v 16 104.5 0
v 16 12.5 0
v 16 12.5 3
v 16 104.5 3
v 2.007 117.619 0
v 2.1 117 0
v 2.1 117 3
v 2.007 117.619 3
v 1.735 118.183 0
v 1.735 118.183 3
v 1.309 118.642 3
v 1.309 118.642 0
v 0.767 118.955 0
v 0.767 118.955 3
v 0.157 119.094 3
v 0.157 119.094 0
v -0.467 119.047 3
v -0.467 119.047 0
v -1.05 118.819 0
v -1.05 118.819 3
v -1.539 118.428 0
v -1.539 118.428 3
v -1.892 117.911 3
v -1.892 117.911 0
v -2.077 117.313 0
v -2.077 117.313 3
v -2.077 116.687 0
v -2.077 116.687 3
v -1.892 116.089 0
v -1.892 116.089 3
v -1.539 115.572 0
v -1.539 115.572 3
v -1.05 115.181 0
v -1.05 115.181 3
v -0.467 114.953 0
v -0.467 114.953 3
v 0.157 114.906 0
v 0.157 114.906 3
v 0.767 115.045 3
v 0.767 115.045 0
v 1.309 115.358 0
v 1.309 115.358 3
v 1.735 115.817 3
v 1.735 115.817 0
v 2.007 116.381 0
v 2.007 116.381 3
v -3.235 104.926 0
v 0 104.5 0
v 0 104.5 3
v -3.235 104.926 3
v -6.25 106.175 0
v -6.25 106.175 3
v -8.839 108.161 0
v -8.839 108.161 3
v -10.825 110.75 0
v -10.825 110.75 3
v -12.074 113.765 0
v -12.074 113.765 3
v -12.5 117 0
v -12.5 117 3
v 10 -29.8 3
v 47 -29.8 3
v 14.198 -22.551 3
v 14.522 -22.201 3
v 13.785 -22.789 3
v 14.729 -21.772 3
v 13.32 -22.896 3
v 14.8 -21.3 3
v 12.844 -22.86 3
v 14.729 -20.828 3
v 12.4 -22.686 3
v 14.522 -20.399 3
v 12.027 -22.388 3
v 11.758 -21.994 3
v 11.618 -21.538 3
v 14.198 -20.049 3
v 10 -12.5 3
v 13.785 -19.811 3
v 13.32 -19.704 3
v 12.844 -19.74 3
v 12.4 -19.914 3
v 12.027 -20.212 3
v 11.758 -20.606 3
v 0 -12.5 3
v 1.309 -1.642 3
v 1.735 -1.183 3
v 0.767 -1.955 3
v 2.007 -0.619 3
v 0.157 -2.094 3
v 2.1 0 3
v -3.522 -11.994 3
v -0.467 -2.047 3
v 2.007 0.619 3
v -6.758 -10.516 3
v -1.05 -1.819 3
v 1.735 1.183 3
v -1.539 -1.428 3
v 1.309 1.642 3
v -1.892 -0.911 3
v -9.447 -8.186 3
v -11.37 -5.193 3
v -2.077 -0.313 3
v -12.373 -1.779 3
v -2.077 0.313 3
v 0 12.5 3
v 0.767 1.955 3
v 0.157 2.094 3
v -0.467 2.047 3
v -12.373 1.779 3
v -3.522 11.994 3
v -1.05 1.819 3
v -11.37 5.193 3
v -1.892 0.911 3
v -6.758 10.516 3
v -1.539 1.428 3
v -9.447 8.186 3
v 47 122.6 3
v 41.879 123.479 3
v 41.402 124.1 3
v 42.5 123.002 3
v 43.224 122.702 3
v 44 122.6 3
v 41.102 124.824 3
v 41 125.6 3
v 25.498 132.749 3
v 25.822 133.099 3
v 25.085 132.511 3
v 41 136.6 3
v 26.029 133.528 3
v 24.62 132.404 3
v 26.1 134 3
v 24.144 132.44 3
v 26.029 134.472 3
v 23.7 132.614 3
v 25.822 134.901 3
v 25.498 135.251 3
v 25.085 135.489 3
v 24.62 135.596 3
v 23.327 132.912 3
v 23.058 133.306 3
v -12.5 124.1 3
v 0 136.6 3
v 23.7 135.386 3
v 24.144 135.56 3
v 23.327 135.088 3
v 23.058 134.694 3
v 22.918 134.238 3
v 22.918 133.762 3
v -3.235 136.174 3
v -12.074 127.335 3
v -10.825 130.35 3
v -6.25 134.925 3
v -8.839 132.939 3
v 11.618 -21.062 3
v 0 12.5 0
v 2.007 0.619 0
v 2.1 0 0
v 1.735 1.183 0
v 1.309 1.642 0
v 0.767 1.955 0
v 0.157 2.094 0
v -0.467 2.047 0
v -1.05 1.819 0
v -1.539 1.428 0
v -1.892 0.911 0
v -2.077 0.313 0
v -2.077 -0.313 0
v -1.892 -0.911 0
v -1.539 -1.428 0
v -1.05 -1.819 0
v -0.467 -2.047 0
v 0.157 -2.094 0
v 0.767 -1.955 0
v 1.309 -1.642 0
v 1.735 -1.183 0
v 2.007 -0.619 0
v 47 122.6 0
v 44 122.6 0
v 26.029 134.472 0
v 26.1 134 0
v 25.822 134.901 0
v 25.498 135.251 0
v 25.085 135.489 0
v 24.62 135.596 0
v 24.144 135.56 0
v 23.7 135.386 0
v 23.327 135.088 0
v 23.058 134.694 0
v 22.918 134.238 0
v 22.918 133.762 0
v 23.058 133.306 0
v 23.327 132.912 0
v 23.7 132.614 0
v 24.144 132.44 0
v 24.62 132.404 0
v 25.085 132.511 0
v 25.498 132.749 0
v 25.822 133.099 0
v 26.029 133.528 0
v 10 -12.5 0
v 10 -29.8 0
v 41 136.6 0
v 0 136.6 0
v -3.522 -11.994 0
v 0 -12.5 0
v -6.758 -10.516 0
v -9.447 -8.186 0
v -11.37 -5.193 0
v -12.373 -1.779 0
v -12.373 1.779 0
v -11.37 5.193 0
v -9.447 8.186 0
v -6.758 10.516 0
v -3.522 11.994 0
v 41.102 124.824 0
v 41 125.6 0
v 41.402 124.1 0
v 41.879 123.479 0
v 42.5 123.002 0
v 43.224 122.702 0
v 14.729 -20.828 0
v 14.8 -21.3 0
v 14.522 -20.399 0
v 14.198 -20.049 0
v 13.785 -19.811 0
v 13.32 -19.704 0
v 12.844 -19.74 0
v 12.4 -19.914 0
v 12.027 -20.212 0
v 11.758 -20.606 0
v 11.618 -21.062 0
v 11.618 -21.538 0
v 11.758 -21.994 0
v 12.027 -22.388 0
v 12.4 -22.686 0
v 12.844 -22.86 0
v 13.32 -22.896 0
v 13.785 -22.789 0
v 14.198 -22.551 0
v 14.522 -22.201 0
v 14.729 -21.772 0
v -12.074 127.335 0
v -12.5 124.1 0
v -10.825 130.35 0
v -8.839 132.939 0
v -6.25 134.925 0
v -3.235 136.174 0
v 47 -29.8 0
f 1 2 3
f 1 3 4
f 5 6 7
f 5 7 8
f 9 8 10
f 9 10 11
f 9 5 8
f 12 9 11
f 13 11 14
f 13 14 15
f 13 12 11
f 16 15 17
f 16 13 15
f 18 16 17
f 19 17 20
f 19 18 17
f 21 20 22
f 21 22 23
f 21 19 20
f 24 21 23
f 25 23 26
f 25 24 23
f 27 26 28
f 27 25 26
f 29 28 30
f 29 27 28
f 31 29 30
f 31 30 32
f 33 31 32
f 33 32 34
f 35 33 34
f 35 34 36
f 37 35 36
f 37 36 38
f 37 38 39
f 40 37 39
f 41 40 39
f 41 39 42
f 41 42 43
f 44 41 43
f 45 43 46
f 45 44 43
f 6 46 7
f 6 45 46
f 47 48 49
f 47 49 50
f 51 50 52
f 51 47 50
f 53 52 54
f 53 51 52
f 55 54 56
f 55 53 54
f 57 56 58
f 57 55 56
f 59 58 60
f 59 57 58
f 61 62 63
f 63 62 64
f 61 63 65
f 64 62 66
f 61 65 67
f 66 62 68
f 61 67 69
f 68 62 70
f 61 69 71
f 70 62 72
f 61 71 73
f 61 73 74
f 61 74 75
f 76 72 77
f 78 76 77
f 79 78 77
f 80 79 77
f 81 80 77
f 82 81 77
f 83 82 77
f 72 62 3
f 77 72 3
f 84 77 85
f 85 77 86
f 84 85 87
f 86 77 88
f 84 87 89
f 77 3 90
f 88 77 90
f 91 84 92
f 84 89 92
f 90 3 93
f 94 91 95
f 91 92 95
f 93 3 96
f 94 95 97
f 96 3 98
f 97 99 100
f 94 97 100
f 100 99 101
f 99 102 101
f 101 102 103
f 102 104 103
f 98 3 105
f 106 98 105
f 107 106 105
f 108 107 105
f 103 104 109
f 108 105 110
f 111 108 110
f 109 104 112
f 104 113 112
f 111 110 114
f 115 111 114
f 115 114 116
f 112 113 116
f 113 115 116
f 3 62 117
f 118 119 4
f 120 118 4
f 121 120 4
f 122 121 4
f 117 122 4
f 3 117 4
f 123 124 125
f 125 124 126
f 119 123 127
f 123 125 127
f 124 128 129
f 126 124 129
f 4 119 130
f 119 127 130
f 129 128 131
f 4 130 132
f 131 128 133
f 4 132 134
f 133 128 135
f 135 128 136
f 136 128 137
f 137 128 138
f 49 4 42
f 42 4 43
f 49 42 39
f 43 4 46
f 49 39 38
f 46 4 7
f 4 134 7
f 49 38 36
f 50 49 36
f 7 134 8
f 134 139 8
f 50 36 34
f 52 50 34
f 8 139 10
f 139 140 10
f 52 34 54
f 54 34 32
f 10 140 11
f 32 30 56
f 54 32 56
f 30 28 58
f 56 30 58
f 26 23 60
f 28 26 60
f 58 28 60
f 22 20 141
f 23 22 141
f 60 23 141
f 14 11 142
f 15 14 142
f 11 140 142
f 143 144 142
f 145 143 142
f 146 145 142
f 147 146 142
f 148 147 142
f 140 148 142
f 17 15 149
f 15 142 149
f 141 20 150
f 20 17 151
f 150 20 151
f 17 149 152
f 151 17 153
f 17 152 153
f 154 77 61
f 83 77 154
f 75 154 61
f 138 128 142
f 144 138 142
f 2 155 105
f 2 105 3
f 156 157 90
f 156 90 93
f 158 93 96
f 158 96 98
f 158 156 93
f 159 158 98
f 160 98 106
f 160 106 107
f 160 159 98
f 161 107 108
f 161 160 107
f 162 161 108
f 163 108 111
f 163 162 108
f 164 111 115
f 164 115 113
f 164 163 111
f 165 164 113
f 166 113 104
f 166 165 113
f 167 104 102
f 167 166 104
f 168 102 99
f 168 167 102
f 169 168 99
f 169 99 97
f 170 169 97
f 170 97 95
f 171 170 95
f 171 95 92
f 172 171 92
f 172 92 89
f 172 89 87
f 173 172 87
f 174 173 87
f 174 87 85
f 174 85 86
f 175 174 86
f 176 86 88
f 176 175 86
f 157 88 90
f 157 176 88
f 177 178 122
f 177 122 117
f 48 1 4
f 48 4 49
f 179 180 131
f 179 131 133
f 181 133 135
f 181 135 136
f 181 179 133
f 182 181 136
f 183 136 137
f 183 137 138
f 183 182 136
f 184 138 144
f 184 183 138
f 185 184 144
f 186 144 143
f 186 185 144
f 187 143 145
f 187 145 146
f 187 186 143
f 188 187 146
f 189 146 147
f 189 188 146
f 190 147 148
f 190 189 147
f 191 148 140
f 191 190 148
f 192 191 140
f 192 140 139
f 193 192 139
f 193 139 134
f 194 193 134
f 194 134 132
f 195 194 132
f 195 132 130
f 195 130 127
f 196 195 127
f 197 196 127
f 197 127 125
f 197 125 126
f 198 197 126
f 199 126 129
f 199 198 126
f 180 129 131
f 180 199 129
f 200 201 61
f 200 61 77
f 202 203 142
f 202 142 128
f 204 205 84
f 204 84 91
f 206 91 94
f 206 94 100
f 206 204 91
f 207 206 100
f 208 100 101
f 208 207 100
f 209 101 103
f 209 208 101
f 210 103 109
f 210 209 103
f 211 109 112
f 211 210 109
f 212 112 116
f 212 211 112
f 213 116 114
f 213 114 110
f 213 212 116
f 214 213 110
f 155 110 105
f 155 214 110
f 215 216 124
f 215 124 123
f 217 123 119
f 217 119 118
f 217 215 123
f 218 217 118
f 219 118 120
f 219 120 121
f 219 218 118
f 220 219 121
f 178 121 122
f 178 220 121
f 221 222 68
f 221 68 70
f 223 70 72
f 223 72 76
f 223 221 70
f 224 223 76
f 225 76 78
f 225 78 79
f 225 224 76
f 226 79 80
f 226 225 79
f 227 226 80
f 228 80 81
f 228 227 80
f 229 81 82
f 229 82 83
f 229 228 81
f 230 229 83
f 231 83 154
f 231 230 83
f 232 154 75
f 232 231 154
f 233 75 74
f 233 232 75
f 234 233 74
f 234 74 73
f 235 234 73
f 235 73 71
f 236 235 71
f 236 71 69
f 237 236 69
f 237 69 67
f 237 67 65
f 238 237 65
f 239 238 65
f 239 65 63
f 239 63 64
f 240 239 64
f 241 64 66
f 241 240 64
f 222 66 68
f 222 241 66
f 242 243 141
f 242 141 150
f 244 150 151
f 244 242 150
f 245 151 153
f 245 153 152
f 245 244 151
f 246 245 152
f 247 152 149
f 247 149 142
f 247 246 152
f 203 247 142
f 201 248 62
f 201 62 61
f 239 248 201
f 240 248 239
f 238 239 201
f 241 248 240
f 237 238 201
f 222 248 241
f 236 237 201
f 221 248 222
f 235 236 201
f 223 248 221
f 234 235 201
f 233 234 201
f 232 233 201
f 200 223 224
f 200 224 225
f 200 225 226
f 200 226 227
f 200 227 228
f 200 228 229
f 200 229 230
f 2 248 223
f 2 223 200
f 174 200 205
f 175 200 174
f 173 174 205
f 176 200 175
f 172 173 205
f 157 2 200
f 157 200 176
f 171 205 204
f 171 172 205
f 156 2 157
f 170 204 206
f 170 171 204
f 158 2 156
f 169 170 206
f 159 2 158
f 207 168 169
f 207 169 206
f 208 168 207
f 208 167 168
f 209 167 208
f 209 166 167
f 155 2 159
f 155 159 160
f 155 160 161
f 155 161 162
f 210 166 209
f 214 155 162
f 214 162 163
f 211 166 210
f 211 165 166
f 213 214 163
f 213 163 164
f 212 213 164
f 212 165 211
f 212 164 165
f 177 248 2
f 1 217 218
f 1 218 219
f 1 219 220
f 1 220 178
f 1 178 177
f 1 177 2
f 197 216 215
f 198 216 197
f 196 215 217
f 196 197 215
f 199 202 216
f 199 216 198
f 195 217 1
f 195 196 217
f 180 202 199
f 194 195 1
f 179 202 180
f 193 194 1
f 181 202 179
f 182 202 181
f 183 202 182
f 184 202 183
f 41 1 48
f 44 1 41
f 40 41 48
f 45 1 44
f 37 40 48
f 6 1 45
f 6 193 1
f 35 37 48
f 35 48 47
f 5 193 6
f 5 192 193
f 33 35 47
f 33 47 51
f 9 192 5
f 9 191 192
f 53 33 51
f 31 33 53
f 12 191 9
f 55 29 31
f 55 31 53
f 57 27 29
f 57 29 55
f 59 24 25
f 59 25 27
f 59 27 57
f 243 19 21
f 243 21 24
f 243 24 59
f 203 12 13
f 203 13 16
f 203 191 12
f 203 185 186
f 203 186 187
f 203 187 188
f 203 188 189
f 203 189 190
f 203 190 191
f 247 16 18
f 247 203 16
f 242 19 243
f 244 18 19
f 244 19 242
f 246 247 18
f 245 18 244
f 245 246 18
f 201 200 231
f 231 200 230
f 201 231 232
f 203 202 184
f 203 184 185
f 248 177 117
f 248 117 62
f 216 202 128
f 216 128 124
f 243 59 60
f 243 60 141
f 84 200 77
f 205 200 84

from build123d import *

# Parameters (mm, degrees)
SKETCH1_R           = 2.1
SKETCH1_R_2         = 1.6
BOSS_EXTRUDE1_DEPTH = 3


with BuildPart() as part:
    # Sketch1 → Boss-Extrude1 (new body)
    with BuildSketch(Plane.XY):
        with BuildLine():
            Line((41, 136.6), (41, 125.6))
            ThreePointArc((41, 125.6), (41.878679656, 123.478679656), (44, 122.6))
            Line((44, 122.6), (47, 122.6))
            Line((47, 122.6), (47, -29.8))
            Line((47, -29.8), (10, -29.8))
            Line((10, -29.8), (10, -12.5))
            Line((10, -12.5), (0, -12.5))
            ThreePointArc((0, -12.5), (-12.5, 0), (0, 12.5))
            Line((0, 12.5), (16, 12.5))
            Line((16, 12.5), (16, 104.5))
            Line((16, 104.5), (0, 104.5))
            ThreePointArc((0, 104.5), (-8.838834765, 108.161165235), (-12.5, 117))
            Line((-12.5, 117), (-12.5, 124.1))
            ThreePointArc((-12.5, 124.1), (-8.838834765, 132.938834765), (0, 136.6))
            Line((0, 136.6), (41, 136.6))
        make_face()
        Circle(SKETCH1_R, mode=Mode.SUBTRACT)
        with Locations((0, 117)):
            Circle(SKETCH1_R, mode=Mode.SUBTRACT)
        with Locations((13.2, -21.3)):
            Circle(SKETCH1_R_2, mode=Mode.SUBTRACT)
        with Locations((24.5, 134)):
            Circle(SKETCH1_R_2, mode=Mode.SUBTRACT)
    extrude(amount=BOSS_EXTRUDE1_DEPTH)


solid = part.part
